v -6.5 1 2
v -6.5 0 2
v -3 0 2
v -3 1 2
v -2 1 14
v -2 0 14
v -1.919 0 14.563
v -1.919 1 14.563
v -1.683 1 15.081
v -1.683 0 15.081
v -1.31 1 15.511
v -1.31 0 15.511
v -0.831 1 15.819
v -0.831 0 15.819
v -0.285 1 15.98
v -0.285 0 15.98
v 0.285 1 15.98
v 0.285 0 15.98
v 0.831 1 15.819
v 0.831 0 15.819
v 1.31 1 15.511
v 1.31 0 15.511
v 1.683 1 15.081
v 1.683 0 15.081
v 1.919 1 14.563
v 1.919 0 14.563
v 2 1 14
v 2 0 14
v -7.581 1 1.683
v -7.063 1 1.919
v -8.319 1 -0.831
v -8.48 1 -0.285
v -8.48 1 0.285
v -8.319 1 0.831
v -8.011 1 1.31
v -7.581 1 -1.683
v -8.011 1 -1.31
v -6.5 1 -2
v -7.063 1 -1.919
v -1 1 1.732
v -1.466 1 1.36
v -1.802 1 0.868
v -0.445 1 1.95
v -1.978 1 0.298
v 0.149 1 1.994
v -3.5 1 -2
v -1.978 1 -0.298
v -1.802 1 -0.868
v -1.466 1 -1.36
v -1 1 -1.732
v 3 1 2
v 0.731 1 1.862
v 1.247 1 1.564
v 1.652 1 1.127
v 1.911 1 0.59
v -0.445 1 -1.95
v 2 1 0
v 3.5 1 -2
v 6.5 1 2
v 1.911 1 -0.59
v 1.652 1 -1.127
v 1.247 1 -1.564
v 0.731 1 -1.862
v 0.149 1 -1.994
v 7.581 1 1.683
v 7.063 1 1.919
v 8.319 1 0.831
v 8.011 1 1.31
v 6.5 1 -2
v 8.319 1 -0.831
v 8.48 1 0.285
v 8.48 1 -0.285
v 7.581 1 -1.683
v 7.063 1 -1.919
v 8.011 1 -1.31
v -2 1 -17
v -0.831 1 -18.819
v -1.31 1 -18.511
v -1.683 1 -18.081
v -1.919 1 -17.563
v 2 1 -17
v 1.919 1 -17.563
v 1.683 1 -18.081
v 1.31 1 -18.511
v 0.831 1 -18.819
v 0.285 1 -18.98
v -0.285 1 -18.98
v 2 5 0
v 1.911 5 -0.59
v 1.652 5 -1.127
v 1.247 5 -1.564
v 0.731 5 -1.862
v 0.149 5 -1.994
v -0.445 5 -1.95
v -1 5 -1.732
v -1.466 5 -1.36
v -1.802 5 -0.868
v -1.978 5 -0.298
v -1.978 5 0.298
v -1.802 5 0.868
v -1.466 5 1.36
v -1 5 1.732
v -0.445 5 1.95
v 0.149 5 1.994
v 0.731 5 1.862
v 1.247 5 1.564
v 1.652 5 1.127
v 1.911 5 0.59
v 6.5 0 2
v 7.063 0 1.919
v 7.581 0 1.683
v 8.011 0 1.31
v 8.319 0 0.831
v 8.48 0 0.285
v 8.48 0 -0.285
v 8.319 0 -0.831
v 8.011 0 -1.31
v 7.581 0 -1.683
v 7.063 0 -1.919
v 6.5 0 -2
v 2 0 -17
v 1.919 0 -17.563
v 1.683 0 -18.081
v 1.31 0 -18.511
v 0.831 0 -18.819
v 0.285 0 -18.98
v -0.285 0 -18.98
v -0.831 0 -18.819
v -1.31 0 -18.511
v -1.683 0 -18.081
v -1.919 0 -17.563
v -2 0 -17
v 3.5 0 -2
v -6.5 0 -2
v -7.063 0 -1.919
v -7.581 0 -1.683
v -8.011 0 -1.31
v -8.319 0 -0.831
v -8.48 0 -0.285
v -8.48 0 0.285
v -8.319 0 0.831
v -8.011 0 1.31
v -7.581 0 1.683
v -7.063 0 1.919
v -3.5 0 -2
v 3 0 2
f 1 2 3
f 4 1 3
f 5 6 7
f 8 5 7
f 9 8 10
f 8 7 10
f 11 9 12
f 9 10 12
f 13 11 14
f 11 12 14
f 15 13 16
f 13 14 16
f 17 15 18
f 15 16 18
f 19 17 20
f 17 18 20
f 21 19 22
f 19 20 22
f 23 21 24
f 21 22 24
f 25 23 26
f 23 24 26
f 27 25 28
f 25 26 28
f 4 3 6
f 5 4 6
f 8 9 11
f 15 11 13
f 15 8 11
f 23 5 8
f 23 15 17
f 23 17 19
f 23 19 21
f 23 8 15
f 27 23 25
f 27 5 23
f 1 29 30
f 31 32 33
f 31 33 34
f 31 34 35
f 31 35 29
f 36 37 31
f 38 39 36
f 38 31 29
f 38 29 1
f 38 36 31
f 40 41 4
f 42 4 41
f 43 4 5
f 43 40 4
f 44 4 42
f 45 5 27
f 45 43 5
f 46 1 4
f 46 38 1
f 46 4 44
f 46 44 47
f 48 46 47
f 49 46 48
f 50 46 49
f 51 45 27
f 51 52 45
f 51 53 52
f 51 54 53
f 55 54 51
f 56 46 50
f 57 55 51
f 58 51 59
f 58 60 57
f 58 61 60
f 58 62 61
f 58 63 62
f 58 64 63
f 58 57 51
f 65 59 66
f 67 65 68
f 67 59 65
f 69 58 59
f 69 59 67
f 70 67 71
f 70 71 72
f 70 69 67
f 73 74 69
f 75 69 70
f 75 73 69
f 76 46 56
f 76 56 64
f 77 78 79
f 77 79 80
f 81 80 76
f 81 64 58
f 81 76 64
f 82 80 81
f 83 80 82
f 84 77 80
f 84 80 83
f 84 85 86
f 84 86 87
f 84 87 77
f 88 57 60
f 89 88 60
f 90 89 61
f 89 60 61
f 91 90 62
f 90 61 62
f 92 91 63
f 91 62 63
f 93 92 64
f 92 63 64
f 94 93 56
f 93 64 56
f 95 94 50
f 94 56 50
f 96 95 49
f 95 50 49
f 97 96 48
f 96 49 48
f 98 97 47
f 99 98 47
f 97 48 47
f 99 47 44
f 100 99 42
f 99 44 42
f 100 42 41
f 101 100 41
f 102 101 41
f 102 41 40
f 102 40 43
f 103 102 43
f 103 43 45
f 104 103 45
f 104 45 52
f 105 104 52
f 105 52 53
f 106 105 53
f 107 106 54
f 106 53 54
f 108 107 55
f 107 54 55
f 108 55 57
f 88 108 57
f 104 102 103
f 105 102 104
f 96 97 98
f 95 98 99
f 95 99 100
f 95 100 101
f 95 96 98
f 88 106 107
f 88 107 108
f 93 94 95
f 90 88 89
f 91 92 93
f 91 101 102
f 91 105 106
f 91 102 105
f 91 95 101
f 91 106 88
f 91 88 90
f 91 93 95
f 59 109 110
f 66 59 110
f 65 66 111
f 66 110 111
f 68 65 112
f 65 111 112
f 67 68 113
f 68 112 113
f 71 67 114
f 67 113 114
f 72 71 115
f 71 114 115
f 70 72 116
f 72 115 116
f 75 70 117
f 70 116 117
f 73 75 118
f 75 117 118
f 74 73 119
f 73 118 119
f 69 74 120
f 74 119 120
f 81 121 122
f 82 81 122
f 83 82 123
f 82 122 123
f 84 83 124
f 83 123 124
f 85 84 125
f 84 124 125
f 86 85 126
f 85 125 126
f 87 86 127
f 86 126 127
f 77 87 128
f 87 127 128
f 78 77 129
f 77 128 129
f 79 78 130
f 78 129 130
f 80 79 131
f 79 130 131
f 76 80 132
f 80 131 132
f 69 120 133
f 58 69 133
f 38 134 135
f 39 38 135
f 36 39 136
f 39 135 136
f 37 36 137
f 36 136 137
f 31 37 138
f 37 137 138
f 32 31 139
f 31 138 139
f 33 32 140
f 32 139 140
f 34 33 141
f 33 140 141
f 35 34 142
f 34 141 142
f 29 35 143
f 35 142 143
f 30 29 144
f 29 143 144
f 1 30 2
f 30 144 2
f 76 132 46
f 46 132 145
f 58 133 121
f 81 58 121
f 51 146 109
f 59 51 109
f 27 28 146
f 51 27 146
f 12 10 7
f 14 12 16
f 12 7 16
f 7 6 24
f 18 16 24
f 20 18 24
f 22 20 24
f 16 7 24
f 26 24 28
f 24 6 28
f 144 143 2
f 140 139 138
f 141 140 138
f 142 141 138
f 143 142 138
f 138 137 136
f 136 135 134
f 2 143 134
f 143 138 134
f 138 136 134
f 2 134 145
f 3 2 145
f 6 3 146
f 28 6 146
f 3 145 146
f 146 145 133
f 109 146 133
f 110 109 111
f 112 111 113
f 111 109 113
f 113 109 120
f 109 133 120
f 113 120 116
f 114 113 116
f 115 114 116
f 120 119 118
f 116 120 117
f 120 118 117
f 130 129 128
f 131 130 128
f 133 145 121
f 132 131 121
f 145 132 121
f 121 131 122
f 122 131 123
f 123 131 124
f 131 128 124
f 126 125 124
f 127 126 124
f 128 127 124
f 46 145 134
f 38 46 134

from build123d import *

# Parameters (mm, degrees)
BOSS_EXTRUDE1_DEPTH = 1
SKETCH2_R           = 2
BOSS_EXTRUDE2_DEPTH = 4


with BuildPart() as part:
    # Sketch1 → Boss-Extrude1 (new body)
    with BuildSketch(Plane(origin=(0, 0, 0), x_dir=(1, 0, 0), z_dir=(0, 1, 0))):
        with BuildLine():
            Line((-3.5, 2), (-6.5, 2))
            ThreePointArc((-6.5, 2), (-8.5, 0), (-6.5, -2))
            Line((-6.5, -2), (-3, -2))
            Line((-3, -2), (-2, -14))
            ThreePointArc((-2, -14), (0, -16), (2, -14))
            Line((2, -14), (3, -2))
            Line((3, -2), (6.5, -2))
            ThreePointArc((6.5, -2), (8.5, 0), (6.5, 2))
            Line((6.5, 2), (3.5, 2))
            Line((3.5, 2), (2, 17))
            ThreePointArc((2, 17), (0, 19), (-2, 17))
            Line((-2, 17), (-3.5, 2))
        make_face()
    extrude(amount=BOSS_EXTRUDE1_DEPTH)

    # Sketch2 → Boss-Extrude2 (add)
    with BuildSketch(Plane(origin=(0, 1, 0), x_dir=(1, 0, 0), z_dir=(0, 1, 0))):
        Circle(SKETCH2_R)
    extrude(amount=BOSS_EXTRUDE2_DEPTH)


solid = part.part
